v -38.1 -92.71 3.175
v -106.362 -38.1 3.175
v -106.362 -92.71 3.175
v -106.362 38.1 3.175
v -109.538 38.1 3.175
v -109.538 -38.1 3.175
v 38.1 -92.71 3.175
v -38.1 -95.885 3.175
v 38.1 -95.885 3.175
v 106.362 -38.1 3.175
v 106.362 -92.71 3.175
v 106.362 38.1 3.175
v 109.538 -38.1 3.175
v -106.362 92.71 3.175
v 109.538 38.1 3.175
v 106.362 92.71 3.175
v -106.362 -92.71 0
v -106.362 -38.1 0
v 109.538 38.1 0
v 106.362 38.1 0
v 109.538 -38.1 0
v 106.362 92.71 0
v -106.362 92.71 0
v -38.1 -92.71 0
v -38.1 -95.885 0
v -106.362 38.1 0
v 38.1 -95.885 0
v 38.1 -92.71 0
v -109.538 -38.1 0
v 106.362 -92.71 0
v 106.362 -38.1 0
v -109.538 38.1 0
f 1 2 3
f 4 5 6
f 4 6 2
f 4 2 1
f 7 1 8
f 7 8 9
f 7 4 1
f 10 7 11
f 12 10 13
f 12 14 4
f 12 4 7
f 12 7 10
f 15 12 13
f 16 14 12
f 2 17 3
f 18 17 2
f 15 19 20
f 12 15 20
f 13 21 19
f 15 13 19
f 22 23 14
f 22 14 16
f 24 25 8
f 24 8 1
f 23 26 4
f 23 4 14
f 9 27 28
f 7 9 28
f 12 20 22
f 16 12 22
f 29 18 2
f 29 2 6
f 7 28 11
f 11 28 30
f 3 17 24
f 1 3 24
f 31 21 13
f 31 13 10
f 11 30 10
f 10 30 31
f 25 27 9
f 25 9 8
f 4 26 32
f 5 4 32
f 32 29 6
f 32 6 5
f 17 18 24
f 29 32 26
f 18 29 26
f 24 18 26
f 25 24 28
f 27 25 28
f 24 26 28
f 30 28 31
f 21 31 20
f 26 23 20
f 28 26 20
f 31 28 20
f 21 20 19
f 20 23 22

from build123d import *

# Parameters (mm, degrees)
SKETCH1_W           = 212.725
SKETCH1_H           = 185.42
BOSS_EXTRUDE1_DEPTH = 3.175
SKETCH5_W           = 3.175
SKETCH5_H           = 76.2
BOSS_EXTRUDE2_DEPTH = 3.175
SKETCH6_W           = 76.2
SKETCH6_H           = 3.175
BOSS_EXTRUDE3_DEPTH = 3.175


with BuildPart() as part:
    # Sketch1 → Boss-Extrude1 (new body)
    with BuildSketch(Plane.XY):
        Rectangle(SKETCH1_W, SKETCH1_H)
    extrude(amount=BOSS_EXTRUDE1_DEPTH)

    # Sketch5 → Boss-Extrude2 (add)
    with BuildSketch(Plane(origin=(0, 0, 0), x_dir=(-1, 0, 0), z_dir=(0, 0, -1))):
        with Locations((-107.95, 0)):
            Rectangle(SKETCH5_W, SKETCH5_H)
        with Locations((107.95, 0)):
            Rectangle(SKETCH5_W, SKETCH5_H)
    extrude(amount=-BOSS_EXTRUDE2_DEPTH)

    # Sketch6 → Boss-Extrude3 (add)
    with BuildSketch(Plane(origin=(0, 0, 0), x_dir=(-1, 0, 0), z_dir=(0, 0, -1))):
        with Locations((0, -94.2975)):
            Rectangle(SKETCH6_W, SKETCH6_H)
    extrude(amount=-BOSS_EXTRUDE3_DEPTH)


solid = part.part
